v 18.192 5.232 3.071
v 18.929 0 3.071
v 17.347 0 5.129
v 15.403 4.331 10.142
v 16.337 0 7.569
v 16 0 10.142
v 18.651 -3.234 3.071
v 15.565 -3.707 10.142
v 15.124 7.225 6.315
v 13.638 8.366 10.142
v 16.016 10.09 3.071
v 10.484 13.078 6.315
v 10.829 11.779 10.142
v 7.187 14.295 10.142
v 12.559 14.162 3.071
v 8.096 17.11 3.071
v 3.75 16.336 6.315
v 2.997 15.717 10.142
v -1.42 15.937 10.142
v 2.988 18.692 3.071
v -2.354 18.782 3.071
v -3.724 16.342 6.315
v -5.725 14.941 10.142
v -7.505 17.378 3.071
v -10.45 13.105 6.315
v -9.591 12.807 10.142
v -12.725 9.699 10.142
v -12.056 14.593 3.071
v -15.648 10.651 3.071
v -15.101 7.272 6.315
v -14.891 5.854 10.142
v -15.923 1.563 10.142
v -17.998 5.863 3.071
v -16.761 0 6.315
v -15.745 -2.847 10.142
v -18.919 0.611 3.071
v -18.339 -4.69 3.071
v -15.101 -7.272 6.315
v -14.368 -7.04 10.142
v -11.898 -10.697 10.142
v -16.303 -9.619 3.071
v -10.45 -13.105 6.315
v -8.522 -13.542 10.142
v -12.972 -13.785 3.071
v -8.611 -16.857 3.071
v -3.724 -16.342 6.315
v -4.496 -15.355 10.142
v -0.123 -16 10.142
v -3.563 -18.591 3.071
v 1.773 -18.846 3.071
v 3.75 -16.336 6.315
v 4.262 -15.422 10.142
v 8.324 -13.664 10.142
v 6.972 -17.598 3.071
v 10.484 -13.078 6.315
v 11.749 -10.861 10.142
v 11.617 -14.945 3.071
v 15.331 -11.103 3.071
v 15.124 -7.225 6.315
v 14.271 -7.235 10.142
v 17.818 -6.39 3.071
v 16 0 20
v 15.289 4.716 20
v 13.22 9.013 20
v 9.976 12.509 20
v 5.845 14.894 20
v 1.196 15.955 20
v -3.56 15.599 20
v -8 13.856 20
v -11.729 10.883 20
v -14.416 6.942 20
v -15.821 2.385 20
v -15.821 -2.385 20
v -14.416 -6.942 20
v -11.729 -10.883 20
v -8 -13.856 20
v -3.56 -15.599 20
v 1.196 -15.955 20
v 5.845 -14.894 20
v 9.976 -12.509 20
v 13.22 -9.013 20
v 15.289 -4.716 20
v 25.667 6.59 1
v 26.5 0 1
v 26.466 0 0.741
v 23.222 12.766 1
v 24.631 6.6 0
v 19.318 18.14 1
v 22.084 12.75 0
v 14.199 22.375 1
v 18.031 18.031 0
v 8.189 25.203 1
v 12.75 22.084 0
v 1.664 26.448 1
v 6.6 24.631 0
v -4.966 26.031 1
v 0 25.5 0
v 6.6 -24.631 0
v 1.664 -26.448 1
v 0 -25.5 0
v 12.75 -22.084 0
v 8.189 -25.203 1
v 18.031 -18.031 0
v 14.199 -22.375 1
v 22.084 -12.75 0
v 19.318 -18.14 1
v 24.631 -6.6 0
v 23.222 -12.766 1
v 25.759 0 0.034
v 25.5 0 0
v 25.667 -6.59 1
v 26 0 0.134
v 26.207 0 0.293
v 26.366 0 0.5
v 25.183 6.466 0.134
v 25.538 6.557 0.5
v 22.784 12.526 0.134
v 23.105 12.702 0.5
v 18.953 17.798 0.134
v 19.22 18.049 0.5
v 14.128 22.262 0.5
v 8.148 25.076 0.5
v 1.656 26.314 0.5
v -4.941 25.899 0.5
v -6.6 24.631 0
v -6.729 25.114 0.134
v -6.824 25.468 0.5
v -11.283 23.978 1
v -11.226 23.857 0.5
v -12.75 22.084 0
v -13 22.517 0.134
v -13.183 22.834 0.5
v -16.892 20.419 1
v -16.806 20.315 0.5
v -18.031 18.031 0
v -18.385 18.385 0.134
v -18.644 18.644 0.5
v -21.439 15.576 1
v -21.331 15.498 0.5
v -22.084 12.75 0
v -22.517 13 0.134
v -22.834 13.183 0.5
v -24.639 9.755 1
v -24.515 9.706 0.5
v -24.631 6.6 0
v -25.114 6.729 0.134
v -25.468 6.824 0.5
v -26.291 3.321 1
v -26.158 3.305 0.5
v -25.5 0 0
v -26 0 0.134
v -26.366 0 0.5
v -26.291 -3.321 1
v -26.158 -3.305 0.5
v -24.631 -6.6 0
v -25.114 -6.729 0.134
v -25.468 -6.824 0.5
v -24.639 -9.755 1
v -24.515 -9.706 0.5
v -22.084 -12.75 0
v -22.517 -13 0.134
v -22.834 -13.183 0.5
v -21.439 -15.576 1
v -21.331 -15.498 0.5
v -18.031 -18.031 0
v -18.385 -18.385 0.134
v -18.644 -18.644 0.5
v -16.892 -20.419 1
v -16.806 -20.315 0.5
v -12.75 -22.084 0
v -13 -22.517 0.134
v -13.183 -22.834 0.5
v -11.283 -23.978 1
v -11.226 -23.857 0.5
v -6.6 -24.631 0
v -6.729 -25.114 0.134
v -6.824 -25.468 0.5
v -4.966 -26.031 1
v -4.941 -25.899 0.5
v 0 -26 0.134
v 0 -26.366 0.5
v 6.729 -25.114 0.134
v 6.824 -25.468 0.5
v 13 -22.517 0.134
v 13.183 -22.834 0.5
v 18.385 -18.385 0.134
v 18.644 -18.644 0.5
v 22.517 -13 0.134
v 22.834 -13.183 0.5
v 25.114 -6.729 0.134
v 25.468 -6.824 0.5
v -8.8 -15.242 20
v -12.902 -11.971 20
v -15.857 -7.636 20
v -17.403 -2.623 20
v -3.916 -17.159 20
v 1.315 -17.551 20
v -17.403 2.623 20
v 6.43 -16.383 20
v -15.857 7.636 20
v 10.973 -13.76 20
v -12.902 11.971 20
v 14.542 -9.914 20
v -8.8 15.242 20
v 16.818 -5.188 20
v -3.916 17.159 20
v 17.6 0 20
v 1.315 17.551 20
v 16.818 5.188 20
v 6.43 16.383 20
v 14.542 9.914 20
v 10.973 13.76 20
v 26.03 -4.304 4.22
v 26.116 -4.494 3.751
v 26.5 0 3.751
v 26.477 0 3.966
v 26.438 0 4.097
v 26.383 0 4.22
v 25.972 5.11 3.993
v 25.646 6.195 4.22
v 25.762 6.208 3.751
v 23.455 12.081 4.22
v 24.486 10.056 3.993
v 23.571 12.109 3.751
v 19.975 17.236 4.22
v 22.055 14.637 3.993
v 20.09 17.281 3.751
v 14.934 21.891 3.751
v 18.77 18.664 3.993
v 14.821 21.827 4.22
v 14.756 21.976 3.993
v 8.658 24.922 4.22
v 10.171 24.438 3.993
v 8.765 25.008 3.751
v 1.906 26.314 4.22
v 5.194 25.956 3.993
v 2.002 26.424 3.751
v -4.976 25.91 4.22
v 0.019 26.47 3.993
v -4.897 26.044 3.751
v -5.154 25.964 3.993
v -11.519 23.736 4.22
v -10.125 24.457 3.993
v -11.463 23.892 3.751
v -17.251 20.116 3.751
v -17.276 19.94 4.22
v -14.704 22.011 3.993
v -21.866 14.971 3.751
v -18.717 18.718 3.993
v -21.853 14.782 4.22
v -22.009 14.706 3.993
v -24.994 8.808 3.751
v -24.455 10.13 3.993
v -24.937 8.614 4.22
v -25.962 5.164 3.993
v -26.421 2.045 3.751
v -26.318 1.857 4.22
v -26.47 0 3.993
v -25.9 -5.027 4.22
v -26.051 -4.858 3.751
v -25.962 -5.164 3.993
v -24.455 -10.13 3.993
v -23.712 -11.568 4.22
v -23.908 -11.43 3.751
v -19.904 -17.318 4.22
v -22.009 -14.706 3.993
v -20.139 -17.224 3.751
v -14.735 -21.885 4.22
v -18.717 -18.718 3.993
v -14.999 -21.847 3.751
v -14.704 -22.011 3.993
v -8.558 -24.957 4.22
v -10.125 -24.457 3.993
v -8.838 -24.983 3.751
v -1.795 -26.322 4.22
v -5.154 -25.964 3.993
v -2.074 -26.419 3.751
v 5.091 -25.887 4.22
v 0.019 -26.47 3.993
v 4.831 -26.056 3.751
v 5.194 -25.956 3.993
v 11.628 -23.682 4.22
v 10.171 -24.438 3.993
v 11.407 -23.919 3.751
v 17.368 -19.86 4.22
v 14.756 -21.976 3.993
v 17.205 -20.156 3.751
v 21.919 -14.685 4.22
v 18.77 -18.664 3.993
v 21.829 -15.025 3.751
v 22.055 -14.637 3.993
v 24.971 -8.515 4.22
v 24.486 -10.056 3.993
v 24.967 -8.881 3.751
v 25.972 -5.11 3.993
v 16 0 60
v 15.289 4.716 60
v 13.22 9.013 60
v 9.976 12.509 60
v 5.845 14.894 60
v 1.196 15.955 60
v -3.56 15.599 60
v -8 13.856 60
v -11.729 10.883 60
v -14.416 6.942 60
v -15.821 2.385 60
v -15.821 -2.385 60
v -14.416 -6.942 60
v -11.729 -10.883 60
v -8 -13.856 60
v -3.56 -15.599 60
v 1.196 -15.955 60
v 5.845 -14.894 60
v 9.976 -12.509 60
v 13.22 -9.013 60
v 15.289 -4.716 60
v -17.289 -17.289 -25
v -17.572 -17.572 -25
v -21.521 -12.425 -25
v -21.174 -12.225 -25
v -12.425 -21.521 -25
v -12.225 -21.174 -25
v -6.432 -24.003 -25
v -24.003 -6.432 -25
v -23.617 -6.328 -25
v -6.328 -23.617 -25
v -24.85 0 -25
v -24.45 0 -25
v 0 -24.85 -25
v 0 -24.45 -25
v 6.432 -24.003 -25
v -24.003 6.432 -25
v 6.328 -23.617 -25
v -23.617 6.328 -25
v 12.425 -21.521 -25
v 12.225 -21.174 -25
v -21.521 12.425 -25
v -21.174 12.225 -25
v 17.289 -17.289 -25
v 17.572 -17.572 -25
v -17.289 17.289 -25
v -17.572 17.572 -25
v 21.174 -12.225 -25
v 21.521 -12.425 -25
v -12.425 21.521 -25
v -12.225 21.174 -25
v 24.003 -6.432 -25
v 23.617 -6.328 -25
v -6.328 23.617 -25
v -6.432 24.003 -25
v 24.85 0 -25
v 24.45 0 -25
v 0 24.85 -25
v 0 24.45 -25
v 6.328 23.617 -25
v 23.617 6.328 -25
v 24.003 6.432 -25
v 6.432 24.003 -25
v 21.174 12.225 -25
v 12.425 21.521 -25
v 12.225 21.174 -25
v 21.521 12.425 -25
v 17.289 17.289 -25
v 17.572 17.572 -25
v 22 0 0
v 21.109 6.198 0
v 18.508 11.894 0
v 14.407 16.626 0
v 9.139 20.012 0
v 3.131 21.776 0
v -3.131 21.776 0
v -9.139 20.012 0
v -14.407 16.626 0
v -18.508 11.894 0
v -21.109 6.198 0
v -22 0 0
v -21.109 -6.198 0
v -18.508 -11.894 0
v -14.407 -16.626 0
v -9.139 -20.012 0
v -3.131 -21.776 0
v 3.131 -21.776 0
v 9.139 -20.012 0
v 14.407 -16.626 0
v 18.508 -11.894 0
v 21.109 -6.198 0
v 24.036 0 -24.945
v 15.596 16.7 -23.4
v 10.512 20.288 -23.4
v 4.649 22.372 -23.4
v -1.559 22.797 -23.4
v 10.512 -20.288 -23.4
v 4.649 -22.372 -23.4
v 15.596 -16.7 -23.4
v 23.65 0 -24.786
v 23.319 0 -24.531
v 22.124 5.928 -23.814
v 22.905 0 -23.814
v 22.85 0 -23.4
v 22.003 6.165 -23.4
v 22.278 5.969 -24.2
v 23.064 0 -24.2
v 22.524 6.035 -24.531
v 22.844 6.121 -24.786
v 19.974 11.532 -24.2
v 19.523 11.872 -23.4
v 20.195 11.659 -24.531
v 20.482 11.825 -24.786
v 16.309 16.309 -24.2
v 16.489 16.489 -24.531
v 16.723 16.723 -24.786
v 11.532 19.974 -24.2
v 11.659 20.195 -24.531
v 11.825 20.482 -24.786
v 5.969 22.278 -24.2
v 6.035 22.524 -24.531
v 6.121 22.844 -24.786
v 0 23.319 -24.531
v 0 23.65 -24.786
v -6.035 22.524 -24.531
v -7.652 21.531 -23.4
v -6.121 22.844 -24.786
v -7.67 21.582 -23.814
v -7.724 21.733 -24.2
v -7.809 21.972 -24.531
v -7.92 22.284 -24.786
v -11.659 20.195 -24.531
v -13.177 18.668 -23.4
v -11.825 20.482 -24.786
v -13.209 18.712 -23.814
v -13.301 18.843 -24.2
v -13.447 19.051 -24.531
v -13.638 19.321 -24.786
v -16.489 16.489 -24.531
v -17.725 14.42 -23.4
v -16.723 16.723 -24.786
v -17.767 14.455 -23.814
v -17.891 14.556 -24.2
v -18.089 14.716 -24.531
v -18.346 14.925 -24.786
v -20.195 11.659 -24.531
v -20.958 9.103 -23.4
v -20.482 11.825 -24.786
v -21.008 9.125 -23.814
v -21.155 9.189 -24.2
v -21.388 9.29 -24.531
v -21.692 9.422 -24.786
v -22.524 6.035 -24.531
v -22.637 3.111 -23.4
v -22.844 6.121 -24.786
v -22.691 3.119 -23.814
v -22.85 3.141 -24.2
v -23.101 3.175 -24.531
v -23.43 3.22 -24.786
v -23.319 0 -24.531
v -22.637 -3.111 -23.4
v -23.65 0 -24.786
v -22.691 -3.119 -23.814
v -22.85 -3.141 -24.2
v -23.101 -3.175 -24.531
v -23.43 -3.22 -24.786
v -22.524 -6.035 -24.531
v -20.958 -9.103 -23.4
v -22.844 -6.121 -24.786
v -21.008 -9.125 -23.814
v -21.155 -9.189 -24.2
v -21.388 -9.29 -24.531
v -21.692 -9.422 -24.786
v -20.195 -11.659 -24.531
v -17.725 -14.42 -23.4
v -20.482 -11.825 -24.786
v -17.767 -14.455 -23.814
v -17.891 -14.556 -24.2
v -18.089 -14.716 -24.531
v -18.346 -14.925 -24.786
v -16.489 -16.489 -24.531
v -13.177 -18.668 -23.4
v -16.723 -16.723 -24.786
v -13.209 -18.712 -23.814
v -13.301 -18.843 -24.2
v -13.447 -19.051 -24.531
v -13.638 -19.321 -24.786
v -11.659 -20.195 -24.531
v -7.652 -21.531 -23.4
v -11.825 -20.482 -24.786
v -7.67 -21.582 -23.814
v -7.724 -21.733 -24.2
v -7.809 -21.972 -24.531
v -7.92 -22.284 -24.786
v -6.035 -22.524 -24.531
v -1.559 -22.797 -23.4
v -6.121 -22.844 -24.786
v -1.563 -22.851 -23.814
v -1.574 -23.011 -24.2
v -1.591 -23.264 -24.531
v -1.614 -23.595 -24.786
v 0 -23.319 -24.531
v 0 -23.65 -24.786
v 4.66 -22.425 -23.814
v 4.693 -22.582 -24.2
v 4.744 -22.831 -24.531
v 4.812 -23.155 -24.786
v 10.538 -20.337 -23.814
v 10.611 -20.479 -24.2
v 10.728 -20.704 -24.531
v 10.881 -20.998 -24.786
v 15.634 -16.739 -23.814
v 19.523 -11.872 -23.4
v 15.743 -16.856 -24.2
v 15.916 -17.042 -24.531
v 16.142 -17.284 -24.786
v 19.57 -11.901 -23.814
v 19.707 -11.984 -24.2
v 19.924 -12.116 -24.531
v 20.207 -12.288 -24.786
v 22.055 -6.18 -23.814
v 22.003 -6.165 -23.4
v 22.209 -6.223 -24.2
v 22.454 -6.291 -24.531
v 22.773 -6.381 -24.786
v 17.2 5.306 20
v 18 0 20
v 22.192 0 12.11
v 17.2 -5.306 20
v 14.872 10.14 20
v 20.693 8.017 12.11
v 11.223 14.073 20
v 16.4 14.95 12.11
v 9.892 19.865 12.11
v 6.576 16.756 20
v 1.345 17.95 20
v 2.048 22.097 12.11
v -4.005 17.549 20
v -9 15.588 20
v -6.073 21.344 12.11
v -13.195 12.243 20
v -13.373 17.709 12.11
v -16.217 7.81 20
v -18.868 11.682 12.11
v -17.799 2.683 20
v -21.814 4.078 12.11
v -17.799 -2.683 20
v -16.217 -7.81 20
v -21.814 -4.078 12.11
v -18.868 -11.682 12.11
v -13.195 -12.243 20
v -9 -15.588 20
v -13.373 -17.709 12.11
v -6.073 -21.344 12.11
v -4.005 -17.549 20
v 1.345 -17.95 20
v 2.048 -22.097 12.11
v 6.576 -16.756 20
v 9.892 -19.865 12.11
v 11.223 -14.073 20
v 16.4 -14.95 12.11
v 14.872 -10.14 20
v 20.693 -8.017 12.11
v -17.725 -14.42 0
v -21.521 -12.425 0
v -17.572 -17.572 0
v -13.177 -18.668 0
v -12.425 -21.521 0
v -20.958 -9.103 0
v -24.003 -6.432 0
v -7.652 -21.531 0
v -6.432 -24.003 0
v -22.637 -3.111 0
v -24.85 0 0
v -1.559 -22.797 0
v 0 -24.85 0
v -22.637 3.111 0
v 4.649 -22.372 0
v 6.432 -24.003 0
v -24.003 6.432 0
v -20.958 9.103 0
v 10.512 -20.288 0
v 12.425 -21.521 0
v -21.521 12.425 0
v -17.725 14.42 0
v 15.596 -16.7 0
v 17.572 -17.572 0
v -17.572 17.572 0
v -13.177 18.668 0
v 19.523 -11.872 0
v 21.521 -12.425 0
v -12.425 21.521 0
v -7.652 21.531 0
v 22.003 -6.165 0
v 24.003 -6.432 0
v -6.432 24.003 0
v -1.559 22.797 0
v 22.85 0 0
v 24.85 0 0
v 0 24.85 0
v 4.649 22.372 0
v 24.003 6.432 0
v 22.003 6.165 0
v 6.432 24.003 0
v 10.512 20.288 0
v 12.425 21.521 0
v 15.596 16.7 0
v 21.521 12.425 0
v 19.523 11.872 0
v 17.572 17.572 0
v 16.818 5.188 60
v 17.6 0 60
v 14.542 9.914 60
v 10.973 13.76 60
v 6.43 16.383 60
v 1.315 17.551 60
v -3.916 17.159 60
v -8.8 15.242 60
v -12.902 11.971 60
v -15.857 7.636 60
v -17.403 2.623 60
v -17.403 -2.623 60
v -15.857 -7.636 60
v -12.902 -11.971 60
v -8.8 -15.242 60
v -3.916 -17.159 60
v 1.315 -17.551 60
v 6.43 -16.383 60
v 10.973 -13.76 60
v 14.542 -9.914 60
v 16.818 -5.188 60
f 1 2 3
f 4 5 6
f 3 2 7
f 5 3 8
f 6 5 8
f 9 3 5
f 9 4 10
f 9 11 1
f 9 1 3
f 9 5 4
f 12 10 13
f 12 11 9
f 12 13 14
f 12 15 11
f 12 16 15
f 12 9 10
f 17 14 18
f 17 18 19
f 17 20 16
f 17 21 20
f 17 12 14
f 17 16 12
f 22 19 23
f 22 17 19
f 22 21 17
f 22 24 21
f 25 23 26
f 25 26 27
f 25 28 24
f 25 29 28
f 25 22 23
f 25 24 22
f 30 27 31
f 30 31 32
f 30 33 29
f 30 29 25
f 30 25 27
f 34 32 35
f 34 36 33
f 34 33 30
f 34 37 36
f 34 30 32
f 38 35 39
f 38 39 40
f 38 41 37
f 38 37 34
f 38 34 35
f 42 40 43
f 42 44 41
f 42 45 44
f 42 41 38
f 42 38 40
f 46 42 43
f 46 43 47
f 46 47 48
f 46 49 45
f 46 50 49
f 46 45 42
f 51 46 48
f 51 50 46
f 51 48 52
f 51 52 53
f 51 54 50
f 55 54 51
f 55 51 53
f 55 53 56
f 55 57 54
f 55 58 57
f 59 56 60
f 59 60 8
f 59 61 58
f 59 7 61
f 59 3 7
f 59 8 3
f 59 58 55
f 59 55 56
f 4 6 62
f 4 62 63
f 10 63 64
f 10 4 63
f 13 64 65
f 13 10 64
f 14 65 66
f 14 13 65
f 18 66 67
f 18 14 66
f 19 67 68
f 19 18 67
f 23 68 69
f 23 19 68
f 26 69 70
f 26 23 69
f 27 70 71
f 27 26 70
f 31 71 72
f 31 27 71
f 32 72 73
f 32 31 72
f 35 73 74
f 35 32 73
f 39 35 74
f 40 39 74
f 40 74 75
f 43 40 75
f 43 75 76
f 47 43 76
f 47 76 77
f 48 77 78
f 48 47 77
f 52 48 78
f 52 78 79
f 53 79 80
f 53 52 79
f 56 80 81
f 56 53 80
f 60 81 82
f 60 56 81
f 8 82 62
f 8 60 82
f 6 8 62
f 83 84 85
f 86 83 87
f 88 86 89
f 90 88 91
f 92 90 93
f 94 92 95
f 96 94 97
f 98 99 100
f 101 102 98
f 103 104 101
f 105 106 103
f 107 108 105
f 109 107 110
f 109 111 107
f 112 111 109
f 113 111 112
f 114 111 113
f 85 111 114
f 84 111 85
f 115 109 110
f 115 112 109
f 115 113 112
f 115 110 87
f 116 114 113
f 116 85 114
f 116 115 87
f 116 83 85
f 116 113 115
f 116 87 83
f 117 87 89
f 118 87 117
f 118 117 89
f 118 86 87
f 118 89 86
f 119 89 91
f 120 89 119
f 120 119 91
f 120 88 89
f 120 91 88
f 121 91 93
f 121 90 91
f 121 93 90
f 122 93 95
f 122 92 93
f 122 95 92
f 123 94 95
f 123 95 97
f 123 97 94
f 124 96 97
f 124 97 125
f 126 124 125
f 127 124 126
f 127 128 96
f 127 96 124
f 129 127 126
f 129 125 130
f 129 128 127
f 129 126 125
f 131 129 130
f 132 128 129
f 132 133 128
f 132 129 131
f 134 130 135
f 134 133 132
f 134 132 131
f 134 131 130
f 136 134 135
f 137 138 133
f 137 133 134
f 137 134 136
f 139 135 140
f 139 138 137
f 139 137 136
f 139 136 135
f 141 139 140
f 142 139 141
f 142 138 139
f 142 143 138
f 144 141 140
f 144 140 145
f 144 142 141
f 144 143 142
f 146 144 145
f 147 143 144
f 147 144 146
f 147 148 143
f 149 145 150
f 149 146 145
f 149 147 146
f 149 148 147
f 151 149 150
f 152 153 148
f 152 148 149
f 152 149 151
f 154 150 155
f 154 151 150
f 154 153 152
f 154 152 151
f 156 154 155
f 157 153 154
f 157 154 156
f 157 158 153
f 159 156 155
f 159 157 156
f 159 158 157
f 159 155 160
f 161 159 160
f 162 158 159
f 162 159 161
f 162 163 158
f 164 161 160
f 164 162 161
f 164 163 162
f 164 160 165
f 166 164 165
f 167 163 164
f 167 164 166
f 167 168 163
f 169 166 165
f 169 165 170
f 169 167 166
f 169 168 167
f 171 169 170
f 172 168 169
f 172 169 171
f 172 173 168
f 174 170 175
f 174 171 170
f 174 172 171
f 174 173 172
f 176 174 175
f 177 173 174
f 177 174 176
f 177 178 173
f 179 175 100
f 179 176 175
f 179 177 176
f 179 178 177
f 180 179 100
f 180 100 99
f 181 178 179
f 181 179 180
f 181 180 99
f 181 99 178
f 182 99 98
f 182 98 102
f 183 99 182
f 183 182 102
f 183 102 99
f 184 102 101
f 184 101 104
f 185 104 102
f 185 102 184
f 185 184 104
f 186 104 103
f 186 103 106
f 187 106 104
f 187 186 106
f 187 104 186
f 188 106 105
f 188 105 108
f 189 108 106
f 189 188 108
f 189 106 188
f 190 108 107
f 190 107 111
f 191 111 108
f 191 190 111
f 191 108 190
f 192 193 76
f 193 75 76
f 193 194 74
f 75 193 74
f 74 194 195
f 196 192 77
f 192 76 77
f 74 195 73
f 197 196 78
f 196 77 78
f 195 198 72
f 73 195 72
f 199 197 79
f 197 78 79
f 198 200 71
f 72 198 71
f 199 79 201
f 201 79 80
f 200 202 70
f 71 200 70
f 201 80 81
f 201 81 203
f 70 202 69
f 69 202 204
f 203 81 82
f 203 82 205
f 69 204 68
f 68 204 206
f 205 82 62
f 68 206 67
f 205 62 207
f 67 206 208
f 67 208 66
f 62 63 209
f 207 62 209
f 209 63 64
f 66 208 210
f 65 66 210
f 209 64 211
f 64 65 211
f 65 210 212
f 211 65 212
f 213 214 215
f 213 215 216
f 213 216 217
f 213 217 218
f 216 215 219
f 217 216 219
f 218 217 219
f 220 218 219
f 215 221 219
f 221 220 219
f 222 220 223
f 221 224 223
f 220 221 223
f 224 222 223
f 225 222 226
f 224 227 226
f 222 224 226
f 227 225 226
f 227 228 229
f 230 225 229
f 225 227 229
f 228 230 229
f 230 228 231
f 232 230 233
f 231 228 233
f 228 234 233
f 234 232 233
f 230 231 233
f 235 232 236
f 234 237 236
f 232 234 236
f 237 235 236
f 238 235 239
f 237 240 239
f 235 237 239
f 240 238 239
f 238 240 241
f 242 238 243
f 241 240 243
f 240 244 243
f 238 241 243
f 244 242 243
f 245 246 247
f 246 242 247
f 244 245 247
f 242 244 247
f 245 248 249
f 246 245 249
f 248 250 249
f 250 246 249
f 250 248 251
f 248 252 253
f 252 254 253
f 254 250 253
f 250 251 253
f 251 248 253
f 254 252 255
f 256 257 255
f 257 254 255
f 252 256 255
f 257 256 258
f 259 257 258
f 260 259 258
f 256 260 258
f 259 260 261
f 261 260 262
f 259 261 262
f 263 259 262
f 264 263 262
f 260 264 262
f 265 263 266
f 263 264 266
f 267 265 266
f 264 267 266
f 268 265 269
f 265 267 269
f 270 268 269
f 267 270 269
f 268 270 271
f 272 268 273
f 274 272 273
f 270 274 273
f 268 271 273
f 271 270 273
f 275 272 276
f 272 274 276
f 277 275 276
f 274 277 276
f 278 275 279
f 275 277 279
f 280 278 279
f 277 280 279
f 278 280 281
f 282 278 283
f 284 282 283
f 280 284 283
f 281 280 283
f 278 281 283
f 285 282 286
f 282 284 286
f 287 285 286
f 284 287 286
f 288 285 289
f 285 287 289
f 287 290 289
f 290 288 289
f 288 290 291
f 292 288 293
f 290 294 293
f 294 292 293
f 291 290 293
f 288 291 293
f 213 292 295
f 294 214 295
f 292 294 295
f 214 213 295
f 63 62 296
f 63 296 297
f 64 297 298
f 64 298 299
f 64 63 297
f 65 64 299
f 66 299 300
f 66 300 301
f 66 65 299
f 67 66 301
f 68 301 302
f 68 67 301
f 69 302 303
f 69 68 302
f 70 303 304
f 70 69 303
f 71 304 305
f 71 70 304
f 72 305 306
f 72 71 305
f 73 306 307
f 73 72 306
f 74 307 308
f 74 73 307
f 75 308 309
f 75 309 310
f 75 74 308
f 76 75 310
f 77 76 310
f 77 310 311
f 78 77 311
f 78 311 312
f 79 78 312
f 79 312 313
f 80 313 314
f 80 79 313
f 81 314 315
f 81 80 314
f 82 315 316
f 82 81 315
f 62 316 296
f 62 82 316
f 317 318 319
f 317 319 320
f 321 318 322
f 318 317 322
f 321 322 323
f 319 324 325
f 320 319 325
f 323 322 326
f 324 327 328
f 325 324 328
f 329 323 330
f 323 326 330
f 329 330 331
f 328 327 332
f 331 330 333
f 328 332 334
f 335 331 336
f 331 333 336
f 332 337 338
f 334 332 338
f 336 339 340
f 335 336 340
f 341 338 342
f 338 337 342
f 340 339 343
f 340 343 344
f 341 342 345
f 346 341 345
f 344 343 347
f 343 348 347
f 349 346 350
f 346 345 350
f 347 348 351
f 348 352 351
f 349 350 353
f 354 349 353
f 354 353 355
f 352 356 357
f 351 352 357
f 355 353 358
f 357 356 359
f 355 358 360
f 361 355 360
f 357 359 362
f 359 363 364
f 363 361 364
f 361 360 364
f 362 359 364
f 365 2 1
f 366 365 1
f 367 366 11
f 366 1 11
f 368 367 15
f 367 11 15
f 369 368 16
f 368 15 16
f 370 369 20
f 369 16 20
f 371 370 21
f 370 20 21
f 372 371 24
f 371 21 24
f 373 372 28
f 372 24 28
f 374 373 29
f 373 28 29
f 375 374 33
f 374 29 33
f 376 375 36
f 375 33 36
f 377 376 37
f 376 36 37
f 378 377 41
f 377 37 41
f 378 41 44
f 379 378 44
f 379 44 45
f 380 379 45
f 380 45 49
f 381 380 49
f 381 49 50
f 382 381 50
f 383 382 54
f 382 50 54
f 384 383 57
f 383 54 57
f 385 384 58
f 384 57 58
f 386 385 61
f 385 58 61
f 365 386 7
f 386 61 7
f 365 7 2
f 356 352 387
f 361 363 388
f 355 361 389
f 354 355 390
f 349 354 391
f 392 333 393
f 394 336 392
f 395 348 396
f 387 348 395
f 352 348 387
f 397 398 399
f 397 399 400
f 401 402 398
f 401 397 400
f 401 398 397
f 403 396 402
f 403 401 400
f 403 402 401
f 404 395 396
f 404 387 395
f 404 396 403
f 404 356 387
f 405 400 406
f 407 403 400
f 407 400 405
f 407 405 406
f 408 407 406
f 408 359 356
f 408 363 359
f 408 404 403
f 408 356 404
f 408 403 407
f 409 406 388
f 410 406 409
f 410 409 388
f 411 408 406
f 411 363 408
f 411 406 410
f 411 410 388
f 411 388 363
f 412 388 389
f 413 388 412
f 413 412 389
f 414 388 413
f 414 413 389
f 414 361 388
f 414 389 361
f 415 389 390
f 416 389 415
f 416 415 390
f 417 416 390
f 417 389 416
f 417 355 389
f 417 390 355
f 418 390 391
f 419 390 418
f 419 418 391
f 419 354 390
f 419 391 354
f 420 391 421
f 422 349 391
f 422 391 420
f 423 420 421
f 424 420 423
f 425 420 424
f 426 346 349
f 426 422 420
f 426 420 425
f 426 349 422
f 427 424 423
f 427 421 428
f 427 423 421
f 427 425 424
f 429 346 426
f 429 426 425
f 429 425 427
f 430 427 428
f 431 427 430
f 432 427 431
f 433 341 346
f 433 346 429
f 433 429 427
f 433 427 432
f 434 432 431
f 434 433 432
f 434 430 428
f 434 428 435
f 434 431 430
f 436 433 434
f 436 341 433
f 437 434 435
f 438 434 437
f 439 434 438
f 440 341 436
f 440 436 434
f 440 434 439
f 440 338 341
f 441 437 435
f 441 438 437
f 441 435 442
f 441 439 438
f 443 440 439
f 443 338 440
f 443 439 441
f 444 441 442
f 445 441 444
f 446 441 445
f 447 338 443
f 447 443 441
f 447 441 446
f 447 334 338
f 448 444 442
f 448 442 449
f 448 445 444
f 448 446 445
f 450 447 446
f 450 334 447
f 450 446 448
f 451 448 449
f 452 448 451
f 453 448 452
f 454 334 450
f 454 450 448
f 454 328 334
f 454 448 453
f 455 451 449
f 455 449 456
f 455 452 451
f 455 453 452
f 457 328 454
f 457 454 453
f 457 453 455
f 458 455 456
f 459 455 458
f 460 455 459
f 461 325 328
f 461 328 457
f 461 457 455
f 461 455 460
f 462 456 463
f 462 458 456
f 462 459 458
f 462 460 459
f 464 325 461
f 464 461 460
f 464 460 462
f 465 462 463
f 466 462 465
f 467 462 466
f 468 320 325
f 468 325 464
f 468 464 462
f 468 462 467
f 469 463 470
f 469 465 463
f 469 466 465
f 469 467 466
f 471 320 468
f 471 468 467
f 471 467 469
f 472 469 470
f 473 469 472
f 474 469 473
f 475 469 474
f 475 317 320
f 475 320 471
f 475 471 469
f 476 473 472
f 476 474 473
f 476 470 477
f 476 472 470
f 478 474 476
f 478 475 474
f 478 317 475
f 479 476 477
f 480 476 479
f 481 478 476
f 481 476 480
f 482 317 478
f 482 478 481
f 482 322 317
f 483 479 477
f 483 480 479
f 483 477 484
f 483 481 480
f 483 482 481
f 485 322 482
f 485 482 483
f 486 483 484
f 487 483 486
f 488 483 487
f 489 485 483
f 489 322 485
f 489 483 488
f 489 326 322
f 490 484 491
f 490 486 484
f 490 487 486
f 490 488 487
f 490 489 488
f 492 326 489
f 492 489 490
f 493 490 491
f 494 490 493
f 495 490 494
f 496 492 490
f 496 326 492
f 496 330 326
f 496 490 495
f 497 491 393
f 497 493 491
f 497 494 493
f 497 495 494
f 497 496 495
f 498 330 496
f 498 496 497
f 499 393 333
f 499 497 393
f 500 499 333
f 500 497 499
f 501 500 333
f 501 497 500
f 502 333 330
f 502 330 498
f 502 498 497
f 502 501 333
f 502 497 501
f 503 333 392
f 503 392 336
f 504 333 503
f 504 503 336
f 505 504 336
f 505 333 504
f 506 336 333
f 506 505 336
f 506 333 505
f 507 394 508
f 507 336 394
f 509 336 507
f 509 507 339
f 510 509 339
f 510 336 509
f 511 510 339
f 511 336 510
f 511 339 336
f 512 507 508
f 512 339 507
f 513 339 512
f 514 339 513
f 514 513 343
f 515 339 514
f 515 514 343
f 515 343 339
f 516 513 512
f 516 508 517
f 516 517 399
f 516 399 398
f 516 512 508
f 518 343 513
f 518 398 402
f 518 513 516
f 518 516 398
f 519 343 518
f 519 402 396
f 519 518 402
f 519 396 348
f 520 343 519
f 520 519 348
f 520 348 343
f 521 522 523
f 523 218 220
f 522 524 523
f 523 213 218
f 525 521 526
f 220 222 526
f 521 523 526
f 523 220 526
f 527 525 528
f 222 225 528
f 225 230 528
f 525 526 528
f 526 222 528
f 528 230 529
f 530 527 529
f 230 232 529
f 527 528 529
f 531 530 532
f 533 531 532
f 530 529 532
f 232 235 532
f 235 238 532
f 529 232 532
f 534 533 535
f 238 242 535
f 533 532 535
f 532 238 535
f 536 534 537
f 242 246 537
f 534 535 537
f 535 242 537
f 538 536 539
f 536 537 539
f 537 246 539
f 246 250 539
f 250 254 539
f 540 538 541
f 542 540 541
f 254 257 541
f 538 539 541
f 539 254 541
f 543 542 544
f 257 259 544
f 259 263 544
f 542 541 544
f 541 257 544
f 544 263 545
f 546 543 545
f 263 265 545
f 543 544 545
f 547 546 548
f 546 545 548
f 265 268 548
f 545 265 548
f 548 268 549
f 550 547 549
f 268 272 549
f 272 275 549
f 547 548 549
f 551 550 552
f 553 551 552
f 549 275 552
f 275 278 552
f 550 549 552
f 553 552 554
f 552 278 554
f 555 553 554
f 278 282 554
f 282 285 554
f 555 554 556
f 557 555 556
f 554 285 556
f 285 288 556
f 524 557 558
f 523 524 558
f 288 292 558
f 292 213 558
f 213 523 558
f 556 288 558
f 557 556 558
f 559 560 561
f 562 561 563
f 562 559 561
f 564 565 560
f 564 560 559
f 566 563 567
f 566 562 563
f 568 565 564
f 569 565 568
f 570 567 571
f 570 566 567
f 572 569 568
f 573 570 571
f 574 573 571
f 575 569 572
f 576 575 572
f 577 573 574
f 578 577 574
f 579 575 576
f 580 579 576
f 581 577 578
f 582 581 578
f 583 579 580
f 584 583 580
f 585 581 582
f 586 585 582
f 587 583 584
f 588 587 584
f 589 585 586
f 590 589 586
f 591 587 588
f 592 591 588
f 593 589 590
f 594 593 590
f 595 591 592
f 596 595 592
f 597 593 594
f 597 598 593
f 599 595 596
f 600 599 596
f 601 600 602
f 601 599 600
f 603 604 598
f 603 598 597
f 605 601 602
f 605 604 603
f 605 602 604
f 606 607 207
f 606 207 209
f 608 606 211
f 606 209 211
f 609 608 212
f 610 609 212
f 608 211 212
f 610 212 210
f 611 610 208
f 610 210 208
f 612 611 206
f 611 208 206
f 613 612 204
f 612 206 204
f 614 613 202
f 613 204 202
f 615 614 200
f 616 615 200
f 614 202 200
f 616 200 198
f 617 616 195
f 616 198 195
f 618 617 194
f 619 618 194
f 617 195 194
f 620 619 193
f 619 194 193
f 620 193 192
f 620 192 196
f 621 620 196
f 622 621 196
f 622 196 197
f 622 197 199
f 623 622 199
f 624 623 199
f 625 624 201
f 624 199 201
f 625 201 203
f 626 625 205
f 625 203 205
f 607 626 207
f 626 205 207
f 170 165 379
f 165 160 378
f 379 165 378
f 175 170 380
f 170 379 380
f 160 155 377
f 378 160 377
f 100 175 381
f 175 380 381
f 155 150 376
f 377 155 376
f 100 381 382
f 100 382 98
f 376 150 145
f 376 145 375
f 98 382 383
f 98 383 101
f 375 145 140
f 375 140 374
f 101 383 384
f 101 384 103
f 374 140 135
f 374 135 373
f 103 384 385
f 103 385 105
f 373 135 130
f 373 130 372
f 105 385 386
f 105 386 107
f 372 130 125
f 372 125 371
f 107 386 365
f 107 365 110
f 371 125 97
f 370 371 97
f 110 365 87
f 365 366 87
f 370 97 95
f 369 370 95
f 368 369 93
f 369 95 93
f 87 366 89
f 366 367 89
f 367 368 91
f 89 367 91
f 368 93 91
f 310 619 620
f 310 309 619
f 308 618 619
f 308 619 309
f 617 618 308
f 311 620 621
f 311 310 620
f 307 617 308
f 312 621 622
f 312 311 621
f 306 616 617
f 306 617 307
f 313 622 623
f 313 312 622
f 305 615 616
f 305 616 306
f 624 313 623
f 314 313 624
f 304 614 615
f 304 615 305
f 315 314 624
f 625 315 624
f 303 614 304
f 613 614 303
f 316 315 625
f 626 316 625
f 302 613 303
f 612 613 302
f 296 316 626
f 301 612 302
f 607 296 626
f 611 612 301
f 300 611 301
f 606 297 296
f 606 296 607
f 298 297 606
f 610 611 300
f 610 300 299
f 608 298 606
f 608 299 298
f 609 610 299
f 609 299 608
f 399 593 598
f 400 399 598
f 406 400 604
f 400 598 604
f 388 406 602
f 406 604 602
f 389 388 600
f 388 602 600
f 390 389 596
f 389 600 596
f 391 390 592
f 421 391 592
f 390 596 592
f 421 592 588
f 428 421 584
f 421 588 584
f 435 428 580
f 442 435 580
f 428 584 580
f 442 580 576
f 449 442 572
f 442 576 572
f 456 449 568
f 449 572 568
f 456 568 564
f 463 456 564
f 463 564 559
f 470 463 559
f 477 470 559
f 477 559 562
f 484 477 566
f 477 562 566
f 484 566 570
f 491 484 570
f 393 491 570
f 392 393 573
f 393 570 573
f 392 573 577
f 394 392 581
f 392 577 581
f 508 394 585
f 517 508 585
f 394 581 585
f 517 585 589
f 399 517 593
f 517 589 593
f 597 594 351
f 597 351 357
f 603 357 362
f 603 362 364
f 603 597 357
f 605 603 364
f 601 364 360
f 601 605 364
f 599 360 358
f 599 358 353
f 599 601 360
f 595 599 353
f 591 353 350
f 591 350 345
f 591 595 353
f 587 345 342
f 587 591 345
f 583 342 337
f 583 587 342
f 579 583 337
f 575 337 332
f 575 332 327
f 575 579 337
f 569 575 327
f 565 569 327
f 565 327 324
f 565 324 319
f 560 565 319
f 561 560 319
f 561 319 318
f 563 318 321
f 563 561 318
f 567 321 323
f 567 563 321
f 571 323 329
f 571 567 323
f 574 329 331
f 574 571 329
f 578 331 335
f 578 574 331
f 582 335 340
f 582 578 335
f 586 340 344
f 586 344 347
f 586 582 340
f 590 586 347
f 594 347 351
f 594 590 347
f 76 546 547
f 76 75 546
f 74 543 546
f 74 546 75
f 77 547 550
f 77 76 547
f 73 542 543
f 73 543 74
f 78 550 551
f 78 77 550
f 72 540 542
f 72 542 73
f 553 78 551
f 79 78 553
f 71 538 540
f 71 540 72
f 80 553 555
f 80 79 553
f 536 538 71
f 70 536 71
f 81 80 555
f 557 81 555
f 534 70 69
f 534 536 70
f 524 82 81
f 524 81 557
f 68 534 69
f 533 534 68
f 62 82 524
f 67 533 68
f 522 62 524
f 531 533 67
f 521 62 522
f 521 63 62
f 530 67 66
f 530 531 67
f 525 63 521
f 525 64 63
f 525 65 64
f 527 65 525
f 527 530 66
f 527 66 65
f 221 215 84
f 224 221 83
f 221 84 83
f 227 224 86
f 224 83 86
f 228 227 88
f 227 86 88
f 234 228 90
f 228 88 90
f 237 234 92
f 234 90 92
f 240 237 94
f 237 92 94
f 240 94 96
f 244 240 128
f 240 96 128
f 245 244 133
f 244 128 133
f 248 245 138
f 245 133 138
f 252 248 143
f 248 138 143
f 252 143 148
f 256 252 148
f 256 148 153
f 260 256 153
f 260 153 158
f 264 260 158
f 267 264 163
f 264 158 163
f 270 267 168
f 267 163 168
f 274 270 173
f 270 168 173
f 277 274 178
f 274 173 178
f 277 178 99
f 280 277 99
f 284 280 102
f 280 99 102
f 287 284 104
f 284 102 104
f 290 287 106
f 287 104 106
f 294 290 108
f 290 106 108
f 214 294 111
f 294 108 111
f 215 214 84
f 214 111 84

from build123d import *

# Parameters (mm, degrees)
F0_R     = 24.85
F0_R_2   = 22.85
F1_DEPTH = 25
F2_START = 20
F0_R_3   = 17.6
F0_R_4   = 16
F2_DEPTH = 40
F0_R_5   = 26.5
F3_DEPTH = 20
F4_SIZE2 = 16
F4_SIZE  = 8.5
F5_SIZE  = 6
F6_R     = 10
F7_R     = 1.6
F8_R     = 1


with BuildPart() as f1:
    # F0 (on Top) → F1 (new body)
    with BuildSketch(Plane.XY):
        Circle(F0_R)
        Circle(F0_R_2, mode=Mode.SUBTRACT)
    extrude(amount=-F1_DEPTH)

    # F7
    f7_edges = [f1.edges().sort_by_distance(p)[0] for p in [
        (-22.85, 0, -25),
    ]]
    fillet(f7_edges, radius=F7_R)


with BuildPart() as f2:
    # F0 (on Top) → F2 (new body)
    with BuildSketch(Plane.XY.offset(F2_START)):
        Circle(F0_R_3)
        Circle(F0_R_4, mode=Mode.SUBTRACT)
    extrude(amount=F2_DEPTH)


with BuildPart() as f3:
    # F0 (on Top) → F3 (new body)
    with BuildSketch(Plane.XY):
        Circle(F0_R_5)
        Circle(F0_R, mode=Mode.SUBTRACT)
        Circle(F0_R)
        Circle(F0_R_2, mode=Mode.SUBTRACT)
        Circle(F0_R_2)
        Circle(F0_R_3, mode=Mode.SUBTRACT)
        Circle(F0_R_3)
        Circle(F0_R_4, mode=Mode.SUBTRACT)
    extrude(amount=F3_DEPTH)

    # F4
    f4_edges = [f3.edges().sort_by_distance(p)[0] for p in [
        (-26.5, 0, 20),
    ]]
    f4_side = f3.faces().sort_by_distance((-16.749533, 0, 20))[0]
    chamfer(f4_edges, length=F4_SIZE, length2=F4_SIZE2, reference=f4_side)

    # F5
    f5_edges = [f3.edges().sort_by_distance(p)[0] for p in [
        (-16, 0, 0),
    ]]
    chamfer(f5_edges, length=F5_SIZE)

    # F6
    f6_edges = [f3.edges().sort_by_distance(p)[0] for p in [
        (-16, 0, 6),
    ]]
    fillet(f6_edges, radius=F6_R)

    # F8
    f8_edges = [f3.edges().sort_by_distance(p)[0] for p in [
        (-26.5, 0, 0),
        (-26.5, 0, 4),
    ]]
    fillet(f8_edges, radius=F8_R)


solid = Compound([f1.part, f2.part, f3.part])
